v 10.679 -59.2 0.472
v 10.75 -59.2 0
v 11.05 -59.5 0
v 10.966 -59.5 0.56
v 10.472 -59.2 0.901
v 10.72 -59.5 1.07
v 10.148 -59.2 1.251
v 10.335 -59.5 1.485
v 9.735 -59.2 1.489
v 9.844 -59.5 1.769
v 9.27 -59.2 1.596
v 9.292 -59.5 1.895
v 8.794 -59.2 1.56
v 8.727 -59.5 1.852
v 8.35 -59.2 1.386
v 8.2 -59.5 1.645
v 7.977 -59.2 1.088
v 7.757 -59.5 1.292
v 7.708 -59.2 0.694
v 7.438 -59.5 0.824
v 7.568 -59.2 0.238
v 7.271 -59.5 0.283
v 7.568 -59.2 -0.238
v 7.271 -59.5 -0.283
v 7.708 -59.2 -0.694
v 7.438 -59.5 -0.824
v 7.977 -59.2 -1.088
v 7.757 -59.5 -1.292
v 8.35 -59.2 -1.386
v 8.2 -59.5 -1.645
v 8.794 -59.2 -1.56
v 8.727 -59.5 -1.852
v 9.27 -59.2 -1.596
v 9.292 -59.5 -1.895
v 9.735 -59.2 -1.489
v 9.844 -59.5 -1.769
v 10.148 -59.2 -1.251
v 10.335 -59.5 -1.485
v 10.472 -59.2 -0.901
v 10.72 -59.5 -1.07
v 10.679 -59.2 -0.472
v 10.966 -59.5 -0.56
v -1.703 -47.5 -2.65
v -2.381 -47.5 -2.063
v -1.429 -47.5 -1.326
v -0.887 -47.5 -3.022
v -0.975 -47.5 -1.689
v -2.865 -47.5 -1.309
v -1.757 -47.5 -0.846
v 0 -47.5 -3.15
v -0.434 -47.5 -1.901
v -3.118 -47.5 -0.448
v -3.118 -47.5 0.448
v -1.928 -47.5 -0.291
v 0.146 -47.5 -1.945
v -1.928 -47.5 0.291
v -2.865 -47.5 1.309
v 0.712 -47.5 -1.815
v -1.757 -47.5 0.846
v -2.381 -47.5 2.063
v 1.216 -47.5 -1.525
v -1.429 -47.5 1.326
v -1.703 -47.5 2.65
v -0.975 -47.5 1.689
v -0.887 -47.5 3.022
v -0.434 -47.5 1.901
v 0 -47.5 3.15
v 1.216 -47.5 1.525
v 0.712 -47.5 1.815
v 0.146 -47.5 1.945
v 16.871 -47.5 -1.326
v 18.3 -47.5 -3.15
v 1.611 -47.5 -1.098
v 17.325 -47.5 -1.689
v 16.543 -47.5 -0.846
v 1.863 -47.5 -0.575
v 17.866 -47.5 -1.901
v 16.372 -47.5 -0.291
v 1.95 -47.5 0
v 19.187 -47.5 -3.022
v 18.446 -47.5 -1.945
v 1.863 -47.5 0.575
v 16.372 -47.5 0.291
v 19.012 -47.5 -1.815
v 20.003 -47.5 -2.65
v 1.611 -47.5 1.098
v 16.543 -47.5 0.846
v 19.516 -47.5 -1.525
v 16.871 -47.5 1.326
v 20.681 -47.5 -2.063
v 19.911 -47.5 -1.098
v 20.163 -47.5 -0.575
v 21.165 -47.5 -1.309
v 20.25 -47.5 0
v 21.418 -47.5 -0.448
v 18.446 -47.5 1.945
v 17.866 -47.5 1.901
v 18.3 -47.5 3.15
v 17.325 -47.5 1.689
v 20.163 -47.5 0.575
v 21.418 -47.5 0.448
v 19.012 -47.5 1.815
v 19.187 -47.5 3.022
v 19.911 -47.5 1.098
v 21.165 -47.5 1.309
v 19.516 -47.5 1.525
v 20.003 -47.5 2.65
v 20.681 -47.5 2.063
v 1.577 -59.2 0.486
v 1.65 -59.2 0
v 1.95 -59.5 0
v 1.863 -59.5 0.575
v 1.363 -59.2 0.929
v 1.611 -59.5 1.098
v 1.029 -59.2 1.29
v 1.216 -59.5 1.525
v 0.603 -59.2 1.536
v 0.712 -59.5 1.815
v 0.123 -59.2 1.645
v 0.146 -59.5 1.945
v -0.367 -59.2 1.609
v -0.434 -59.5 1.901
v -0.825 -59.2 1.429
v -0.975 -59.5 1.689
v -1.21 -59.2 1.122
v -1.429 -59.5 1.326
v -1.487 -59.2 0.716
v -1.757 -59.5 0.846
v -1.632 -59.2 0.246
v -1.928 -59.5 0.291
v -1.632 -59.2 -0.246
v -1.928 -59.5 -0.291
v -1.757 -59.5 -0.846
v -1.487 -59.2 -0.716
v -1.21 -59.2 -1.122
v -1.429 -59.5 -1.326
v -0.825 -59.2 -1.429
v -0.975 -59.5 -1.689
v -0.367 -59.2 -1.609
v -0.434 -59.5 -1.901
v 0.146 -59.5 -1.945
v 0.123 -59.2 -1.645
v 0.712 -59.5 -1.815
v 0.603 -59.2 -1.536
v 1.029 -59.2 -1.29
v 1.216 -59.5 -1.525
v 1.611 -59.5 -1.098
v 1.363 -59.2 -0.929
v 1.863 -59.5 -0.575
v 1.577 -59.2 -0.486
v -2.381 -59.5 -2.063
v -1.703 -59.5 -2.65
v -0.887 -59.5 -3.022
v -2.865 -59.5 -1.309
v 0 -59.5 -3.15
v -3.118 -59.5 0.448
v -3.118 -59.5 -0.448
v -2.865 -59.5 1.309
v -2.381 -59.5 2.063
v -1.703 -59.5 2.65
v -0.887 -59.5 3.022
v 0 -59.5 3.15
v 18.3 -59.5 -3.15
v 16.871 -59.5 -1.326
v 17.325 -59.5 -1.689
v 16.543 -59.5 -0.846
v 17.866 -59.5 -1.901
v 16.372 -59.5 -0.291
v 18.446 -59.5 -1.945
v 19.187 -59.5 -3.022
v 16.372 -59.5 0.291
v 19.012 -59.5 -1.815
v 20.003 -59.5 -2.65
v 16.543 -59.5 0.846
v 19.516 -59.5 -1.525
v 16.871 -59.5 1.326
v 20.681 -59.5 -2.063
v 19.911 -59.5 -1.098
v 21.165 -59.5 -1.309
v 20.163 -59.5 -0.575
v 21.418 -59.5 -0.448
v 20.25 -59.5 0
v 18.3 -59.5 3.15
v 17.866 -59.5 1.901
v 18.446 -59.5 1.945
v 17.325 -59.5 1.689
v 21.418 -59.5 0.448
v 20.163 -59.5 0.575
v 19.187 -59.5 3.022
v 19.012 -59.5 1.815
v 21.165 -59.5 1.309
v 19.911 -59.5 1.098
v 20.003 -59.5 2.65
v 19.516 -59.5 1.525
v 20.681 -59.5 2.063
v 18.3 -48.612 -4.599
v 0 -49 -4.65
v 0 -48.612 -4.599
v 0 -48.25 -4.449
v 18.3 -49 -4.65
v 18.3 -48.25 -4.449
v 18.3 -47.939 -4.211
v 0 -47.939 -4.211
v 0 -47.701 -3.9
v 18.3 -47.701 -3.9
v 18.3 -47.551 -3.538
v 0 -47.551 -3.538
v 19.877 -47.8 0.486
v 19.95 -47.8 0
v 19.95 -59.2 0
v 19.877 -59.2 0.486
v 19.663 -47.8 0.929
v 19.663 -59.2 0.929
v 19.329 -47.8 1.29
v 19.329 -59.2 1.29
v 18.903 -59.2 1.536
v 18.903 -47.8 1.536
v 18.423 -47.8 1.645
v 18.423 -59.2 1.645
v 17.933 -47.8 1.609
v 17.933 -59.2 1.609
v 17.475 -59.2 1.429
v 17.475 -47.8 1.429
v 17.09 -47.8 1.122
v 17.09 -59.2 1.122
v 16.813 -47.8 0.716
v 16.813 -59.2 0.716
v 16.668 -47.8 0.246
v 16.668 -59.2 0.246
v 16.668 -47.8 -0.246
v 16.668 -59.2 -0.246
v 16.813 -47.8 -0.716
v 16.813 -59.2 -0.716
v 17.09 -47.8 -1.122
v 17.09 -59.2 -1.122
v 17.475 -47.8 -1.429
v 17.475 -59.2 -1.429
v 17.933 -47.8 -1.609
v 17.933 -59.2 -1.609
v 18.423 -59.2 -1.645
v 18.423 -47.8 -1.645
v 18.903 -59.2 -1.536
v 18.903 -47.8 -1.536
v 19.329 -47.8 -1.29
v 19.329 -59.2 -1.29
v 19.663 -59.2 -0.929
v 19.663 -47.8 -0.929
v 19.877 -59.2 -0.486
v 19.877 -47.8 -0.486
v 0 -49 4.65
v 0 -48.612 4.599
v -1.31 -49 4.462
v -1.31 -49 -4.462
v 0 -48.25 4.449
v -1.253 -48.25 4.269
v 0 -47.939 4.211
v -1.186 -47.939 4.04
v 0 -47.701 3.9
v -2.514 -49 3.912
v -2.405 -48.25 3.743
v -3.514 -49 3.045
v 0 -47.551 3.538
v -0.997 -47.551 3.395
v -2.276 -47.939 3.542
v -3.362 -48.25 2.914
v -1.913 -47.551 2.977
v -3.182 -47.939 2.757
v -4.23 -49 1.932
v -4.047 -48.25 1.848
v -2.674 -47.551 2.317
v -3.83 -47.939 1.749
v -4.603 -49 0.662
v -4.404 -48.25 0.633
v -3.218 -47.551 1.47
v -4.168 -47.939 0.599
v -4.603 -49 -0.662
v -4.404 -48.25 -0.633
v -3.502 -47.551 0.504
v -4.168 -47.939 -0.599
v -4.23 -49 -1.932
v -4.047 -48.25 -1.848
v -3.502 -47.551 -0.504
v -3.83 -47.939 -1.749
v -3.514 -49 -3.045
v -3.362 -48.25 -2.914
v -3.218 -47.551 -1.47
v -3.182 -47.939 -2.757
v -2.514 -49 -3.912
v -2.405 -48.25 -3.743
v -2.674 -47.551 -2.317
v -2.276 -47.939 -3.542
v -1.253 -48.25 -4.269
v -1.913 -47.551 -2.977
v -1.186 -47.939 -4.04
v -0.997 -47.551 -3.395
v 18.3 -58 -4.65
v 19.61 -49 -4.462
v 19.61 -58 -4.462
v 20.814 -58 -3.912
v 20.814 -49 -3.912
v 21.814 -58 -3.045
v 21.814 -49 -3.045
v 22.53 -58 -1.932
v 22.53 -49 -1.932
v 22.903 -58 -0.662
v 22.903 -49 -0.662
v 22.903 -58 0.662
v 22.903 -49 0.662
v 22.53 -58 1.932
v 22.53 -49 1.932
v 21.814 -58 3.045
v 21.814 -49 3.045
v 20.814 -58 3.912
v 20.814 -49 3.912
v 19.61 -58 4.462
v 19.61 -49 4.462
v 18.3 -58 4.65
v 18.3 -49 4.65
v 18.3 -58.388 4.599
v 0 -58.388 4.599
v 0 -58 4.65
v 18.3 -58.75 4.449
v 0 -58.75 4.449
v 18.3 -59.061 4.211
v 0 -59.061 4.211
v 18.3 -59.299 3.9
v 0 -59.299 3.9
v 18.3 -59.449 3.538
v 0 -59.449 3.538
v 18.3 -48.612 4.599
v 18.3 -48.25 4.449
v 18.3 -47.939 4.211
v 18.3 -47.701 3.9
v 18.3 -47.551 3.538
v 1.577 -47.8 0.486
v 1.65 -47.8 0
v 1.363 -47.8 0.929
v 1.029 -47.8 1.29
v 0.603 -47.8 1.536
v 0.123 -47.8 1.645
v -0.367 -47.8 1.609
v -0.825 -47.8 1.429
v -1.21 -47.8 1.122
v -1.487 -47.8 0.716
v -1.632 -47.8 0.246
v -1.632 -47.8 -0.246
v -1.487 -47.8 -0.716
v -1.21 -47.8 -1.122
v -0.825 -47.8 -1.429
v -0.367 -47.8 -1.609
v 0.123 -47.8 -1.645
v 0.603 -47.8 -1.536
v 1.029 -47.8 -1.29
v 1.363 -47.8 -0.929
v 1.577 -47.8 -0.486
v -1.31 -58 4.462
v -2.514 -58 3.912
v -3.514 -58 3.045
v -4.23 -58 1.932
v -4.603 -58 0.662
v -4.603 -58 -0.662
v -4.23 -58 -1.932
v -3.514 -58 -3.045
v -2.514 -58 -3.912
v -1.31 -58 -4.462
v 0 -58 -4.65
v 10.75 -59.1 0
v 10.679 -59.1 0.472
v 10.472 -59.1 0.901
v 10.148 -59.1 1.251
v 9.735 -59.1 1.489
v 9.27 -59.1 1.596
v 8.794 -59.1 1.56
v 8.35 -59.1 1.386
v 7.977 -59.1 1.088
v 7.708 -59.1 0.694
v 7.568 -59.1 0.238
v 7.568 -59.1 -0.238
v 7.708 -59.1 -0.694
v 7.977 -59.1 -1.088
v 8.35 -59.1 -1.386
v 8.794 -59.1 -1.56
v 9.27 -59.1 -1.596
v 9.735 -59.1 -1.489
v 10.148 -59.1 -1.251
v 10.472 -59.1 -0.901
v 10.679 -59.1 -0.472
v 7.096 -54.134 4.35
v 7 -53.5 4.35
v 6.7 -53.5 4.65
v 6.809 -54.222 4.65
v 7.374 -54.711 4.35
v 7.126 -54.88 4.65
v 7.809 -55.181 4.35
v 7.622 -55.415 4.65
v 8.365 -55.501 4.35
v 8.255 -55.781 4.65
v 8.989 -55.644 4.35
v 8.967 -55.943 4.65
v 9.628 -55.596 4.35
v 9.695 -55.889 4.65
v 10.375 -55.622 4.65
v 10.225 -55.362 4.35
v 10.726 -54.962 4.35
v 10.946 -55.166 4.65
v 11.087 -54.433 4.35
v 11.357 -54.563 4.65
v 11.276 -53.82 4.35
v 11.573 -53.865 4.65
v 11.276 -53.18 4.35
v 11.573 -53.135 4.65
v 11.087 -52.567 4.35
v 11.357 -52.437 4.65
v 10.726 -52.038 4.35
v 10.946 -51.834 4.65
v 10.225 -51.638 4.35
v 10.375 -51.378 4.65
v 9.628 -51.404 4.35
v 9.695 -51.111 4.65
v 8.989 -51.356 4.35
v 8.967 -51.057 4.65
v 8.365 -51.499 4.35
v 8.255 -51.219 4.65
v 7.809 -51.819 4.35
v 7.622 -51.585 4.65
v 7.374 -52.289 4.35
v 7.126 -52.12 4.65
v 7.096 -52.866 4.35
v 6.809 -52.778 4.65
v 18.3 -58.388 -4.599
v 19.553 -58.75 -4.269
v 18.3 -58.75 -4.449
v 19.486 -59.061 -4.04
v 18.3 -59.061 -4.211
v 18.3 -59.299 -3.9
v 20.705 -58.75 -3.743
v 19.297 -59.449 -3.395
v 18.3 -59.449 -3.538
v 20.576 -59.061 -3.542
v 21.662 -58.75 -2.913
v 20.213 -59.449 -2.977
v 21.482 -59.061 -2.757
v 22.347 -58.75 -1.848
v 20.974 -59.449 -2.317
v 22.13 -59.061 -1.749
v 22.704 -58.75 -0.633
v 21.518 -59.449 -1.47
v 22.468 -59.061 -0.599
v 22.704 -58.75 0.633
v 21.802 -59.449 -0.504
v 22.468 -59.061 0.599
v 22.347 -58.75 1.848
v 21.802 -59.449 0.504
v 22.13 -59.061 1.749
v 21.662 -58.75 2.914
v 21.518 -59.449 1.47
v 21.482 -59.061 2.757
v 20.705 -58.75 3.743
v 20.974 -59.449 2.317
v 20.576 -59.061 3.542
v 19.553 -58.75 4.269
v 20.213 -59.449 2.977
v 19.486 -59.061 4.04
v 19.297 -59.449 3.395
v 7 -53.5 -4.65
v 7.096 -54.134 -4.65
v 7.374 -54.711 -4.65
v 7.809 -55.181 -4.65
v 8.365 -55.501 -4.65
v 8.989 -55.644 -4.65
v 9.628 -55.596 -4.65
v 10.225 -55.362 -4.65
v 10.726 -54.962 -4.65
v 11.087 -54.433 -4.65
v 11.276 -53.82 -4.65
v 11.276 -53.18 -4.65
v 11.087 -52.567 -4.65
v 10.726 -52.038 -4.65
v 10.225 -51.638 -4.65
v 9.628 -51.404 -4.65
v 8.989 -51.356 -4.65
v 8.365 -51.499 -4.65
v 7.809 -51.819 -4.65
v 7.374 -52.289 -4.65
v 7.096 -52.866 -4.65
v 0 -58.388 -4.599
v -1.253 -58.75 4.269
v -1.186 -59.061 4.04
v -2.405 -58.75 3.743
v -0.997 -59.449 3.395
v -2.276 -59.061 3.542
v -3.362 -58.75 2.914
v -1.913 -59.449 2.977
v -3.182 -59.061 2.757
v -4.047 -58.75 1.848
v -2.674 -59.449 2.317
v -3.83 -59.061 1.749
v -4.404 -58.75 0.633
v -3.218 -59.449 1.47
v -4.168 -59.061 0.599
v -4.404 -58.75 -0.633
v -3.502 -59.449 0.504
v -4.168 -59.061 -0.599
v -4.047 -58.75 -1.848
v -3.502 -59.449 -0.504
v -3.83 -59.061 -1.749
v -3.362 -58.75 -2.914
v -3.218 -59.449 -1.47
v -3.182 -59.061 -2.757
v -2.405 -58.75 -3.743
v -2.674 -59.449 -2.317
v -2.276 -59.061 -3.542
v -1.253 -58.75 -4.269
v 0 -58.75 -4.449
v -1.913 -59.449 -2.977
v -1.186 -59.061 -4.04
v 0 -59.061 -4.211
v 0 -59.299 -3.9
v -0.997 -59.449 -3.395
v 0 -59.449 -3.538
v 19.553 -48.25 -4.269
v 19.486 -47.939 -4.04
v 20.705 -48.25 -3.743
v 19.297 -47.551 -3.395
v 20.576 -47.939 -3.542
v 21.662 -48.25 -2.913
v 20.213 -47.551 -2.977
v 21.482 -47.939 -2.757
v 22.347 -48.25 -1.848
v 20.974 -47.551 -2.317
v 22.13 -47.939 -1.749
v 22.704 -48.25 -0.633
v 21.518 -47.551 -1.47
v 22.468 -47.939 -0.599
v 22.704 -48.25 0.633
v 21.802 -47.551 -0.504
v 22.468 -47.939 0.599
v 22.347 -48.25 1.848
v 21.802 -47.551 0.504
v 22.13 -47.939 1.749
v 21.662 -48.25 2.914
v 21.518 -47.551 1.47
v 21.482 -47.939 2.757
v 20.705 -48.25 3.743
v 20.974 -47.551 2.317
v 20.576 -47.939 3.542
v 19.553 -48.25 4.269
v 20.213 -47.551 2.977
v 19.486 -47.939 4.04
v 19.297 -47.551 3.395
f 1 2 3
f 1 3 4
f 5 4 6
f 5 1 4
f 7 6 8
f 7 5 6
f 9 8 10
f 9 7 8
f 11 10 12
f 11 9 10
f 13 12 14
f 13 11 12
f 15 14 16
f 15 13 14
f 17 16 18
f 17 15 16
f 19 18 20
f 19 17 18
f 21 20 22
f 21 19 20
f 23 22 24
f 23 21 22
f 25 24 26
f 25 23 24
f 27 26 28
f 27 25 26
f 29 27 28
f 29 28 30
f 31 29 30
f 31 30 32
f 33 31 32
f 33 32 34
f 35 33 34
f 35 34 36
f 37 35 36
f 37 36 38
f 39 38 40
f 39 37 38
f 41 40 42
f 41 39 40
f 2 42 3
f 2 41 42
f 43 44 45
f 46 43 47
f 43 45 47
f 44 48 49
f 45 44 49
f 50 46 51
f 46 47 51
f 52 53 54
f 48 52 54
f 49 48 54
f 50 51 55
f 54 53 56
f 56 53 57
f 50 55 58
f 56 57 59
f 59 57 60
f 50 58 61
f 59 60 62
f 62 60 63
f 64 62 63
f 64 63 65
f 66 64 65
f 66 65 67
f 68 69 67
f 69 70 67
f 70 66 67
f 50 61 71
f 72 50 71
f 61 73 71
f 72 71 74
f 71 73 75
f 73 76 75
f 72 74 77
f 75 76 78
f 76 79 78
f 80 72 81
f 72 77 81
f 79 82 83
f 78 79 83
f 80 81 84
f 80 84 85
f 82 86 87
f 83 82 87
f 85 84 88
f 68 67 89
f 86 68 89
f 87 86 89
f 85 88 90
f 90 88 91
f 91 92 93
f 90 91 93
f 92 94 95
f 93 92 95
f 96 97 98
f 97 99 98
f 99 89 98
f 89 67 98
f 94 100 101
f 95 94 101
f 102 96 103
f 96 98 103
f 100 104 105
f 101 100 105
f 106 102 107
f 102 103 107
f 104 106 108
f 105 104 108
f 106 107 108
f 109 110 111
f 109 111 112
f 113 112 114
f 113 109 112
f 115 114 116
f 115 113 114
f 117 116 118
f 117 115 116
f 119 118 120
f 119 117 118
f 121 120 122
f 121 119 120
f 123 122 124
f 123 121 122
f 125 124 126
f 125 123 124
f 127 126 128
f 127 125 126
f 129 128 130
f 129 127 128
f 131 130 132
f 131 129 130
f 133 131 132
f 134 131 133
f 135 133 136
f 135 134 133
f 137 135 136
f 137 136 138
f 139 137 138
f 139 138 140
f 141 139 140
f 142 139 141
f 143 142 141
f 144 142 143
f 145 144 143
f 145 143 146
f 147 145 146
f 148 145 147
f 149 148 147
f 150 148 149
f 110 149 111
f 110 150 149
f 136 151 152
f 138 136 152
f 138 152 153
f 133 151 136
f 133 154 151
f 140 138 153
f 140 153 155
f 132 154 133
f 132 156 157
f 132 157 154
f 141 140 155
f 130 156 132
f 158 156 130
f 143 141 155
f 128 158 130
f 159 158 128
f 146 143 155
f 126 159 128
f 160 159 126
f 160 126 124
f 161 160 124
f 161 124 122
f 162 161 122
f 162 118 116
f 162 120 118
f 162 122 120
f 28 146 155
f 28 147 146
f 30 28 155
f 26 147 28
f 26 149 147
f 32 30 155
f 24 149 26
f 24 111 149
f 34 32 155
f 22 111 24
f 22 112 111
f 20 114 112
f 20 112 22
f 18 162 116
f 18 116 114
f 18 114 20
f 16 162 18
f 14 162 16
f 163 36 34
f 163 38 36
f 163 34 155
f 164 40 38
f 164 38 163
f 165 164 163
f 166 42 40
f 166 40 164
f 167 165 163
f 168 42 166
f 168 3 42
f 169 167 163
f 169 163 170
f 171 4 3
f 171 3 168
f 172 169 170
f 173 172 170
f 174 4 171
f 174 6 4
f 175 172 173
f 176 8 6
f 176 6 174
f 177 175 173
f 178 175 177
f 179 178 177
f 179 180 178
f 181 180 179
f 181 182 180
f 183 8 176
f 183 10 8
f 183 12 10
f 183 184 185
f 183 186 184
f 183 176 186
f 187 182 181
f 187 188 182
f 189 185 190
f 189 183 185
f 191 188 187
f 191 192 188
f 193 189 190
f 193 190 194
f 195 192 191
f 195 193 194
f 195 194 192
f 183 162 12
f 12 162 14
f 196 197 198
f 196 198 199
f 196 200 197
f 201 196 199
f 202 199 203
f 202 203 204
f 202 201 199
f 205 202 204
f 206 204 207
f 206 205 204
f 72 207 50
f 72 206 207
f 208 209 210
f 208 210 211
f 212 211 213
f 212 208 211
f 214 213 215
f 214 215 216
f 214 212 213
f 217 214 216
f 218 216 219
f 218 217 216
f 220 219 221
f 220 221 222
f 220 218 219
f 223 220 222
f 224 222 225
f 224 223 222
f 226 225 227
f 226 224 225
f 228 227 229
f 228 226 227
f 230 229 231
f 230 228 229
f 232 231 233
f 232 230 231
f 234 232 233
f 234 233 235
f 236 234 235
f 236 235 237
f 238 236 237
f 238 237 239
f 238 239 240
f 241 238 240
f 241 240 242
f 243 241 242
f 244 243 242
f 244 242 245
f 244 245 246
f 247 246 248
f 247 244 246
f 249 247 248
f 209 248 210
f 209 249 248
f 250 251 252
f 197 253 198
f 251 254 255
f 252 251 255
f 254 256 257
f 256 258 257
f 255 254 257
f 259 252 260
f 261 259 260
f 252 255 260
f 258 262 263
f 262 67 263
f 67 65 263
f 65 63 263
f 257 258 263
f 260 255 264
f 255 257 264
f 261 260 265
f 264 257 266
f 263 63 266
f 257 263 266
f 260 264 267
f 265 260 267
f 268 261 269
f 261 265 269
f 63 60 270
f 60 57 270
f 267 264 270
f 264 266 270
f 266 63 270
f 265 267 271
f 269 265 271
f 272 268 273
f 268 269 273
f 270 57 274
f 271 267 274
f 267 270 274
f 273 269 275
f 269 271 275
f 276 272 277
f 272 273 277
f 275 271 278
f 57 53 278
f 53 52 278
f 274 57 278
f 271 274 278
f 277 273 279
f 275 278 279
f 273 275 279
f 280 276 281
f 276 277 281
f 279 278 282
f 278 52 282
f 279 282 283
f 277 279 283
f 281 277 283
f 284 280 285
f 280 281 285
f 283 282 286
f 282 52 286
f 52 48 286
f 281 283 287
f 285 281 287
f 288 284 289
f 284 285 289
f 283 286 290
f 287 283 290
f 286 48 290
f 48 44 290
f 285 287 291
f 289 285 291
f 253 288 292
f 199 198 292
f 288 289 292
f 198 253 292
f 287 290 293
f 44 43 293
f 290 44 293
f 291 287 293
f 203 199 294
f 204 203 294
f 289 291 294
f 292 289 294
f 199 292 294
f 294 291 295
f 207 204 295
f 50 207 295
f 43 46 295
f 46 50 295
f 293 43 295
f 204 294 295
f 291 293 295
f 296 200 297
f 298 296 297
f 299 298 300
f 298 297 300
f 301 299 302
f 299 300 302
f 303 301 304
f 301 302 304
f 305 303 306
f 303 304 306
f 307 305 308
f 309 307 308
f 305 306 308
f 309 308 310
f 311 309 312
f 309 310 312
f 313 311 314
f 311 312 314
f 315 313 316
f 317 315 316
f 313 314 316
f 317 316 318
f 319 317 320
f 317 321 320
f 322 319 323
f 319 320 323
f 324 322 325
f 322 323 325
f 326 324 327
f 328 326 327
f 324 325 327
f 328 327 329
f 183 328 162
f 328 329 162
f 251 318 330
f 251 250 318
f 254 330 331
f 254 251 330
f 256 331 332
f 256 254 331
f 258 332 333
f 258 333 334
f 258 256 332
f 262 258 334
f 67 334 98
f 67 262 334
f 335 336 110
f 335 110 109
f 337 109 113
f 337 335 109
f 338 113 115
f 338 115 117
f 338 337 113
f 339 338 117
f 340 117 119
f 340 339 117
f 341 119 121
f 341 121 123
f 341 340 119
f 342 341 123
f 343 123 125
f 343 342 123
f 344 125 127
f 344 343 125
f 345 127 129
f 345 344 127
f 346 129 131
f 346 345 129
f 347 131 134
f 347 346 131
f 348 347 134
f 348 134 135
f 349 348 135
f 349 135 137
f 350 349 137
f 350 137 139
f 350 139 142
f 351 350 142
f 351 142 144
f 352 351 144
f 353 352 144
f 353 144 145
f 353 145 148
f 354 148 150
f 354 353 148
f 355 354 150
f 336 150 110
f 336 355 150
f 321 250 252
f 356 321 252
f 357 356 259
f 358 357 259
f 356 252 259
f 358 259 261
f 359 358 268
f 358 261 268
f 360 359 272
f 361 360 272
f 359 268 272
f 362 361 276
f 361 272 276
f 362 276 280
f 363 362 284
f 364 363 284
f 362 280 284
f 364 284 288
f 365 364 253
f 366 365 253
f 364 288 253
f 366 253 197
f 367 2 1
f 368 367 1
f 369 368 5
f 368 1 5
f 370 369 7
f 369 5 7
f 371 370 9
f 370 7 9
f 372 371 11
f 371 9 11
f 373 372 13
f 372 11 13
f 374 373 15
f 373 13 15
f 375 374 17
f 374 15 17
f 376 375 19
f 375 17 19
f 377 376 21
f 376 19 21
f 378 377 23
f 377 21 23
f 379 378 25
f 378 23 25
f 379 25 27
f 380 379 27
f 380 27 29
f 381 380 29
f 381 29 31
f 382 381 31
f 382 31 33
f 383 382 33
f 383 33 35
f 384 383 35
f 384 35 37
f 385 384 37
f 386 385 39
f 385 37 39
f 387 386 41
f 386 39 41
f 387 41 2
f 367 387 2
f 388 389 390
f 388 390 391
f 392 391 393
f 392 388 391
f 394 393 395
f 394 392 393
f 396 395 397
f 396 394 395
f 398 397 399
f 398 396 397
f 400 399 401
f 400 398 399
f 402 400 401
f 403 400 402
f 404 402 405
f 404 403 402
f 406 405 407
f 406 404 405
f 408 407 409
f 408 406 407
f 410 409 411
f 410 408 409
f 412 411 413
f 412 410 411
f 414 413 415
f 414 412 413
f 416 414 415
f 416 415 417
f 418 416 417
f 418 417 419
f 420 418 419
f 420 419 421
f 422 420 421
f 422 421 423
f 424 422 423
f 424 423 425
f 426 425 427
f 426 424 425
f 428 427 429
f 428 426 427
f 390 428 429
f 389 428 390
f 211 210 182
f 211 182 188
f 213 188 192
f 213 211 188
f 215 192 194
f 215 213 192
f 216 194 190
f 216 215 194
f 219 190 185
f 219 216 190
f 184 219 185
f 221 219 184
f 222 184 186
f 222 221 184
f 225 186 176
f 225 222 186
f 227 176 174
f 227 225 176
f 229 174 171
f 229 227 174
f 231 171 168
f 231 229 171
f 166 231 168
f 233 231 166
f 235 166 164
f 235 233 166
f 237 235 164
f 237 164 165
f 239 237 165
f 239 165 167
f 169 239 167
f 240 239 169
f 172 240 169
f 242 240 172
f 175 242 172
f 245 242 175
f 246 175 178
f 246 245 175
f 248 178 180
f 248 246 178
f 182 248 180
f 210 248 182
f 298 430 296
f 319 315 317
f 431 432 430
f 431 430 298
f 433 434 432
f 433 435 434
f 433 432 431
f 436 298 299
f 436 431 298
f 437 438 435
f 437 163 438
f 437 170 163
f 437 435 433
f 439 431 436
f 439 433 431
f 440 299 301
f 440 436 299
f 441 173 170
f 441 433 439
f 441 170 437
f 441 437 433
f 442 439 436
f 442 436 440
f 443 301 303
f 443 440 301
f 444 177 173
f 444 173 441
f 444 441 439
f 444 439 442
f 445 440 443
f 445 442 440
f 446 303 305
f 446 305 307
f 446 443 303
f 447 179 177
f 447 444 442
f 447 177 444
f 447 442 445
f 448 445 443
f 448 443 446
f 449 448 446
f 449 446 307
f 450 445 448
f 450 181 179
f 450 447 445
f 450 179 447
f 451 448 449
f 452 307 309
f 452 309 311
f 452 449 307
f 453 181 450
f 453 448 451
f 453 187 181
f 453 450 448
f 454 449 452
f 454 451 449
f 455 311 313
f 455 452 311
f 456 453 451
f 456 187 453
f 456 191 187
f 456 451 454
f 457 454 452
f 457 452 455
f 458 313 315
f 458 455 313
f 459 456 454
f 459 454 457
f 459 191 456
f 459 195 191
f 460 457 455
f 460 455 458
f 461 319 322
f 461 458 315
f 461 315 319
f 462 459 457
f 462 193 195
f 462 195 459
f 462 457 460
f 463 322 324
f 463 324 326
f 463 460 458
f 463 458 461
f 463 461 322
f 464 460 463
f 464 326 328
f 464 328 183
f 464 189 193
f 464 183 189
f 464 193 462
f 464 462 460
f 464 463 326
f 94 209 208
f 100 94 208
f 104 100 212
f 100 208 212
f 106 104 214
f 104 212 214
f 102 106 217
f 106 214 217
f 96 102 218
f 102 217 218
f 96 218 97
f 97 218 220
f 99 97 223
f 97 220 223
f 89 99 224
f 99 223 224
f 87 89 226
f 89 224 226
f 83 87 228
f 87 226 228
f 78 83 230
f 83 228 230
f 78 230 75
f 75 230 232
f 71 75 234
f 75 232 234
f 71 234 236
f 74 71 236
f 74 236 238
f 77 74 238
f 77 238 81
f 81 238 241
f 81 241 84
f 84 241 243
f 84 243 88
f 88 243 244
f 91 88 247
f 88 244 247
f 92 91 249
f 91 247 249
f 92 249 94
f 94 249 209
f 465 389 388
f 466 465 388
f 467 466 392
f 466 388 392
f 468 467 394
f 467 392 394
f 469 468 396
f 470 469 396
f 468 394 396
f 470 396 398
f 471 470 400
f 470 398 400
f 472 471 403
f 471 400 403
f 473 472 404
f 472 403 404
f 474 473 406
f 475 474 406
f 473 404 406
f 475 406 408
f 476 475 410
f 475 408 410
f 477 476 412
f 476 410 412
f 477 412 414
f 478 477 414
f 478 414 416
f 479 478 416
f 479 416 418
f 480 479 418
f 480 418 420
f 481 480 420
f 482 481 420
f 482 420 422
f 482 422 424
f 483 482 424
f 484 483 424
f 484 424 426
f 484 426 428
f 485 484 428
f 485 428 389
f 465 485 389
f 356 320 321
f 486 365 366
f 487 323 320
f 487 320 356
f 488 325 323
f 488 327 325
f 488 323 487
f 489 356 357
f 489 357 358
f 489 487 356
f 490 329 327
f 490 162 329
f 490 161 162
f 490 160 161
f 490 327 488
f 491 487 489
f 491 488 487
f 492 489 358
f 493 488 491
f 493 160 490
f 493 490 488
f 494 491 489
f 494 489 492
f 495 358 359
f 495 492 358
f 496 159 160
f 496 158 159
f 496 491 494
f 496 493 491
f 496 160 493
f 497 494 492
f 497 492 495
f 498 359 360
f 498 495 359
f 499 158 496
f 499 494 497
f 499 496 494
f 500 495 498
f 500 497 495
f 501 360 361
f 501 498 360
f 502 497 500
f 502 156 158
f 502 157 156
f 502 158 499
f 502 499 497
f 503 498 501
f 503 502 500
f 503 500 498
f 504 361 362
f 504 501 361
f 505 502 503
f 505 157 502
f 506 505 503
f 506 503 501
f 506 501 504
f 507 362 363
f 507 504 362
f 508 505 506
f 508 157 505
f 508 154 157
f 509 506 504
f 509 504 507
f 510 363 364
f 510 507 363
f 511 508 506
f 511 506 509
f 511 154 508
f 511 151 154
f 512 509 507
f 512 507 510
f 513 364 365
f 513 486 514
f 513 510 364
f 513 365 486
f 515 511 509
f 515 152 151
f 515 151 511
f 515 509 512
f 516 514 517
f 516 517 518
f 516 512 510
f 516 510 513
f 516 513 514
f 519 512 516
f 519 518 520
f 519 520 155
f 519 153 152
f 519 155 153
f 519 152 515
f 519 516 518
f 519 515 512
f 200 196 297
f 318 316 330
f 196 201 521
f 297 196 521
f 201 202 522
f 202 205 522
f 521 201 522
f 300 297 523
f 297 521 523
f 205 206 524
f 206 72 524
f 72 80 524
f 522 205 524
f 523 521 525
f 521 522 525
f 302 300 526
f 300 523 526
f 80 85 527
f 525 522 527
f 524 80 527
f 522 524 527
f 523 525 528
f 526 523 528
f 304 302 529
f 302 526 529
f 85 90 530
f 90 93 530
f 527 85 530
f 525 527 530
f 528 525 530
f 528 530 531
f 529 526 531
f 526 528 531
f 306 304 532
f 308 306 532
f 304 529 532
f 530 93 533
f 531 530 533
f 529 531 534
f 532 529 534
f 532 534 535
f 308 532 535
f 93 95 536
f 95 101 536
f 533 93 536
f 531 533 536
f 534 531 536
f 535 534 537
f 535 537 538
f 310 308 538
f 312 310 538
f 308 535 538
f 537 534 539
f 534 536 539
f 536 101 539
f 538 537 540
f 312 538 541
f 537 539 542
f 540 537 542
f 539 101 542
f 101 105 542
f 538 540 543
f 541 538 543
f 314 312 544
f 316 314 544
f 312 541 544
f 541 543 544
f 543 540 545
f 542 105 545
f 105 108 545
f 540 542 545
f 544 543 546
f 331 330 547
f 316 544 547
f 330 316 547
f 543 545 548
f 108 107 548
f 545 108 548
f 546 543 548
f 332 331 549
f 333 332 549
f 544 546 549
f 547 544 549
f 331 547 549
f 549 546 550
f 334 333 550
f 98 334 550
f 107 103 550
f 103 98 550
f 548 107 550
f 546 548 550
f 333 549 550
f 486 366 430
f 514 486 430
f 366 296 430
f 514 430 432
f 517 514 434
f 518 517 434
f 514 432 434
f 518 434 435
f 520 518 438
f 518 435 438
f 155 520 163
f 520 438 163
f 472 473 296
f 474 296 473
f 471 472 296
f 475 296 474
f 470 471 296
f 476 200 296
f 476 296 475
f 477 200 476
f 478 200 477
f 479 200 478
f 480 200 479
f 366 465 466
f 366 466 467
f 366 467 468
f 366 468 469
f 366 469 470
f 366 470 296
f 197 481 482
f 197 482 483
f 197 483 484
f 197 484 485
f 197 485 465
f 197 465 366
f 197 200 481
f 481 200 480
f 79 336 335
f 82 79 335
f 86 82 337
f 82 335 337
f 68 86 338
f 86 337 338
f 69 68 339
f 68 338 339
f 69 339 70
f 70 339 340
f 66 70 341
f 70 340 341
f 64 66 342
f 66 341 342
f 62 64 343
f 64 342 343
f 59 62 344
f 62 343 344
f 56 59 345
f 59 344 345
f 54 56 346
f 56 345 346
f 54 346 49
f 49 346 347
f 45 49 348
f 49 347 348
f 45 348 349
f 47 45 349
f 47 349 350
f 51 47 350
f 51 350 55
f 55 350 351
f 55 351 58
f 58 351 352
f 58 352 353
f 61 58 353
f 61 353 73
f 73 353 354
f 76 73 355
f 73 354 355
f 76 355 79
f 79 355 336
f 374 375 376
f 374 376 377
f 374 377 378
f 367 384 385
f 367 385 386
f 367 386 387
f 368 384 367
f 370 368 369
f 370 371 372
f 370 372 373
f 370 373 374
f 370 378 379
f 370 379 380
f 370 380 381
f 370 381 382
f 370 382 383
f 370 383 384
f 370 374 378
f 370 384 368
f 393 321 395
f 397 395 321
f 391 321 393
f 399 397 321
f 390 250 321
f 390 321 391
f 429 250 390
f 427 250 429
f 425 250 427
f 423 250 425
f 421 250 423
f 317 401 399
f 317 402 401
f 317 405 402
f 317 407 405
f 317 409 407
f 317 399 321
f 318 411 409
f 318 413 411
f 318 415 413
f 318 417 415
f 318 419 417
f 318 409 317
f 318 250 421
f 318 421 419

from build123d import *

# Parameters (mm, degrees)
SKETCH005_R     = 1.65
PAD003_DEPTH    = 12
SKETCH006_R     = 2.15
POCKET004_DEPTH = 20
CHAMFER002_SIZE = 0.3
FILLET002_R     = 1.5
SKETCH007_R     = 1.6
POCKET005_DEPTH = 0.4
CHAMFER003_SIZE = 0.3


with BuildPart() as part:
    # Sketch005 → Pad003 (new body)
    with BuildSketch(Plane.XZ):
        with BuildLine():
            ThreePointArc((0, 4.65), (-4.65, 0), (0, -4.65))
            Line((18.300003, -4.65), (0, -4.65))
            ThreePointArc((18.300003, -4.65), (22.95, 2e-06), (18.3, 4.65))
            Line((0, 4.65), (18.3, 4.65))
        make_face()
        Circle(SKETCH005_R, mode=Mode.SUBTRACT)
        with Locations((18.3, 0)):
            Circle(SKETCH005_R, mode=Mode.SUBTRACT)
    extrude(amount=PAD003_DEPTH)

    # Sketch006 (on Face2 of Pad003) → Pocket004 (cut)
    with BuildSketch(Plane(origin=(0, 0, 4.65), x_dir=(-1, 0, 0), z_dir=(0, 0, 1))):
        with Locations((-9.15, 6)):
            Circle(SKETCH006_R)
    extrude(amount=-POCKET004_DEPTH, mode=Mode.SUBTRACT)

    # Chamfer002
    chamfer002_edges = [part.edges().sort_by_distance(p)[0] for p in [
        (-1.65, -12, 0),
        (11.3, -6, 4.65),
        (16.65, -12, 0),
        (16.65, 0, 0),
        (-1.65, 0, 0),
    ]]
    chamfer(chamfer002_edges, length=CHAMFER002_SIZE)

    # Fillet002
    fillet002_edges = [part.edges().sort_by_distance(p)[0] for p in [
        (-4.65, 0, 0),
        (-4.65, -12, 0),
    ]]
    fillet(fillet002_edges, radius=FILLET002_R)

    # Sketch007 (on Face13 of Fillet002) → Pocket005 (cut)
    with BuildSketch(Plane.XZ.offset(12)):
        with Locations((9.15, 0)):
            Circle(SKETCH007_R)
    extrude(amount=-POCKET005_DEPTH, mode=Mode.SUBTRACT)

    # Chamfer003
    chamfer003_edges = [part.edges().sort_by_distance(p)[0] for p in [
        (7.55, -12, 0),
    ]]
    chamfer(chamfer003_edges, length=CHAMFER003_SIZE)


with BuildPart() as part_1:
    # Body002 placement: moved
    add(part.part.moved(Location((0, -47.5, 0))))


solid = part_1.part
